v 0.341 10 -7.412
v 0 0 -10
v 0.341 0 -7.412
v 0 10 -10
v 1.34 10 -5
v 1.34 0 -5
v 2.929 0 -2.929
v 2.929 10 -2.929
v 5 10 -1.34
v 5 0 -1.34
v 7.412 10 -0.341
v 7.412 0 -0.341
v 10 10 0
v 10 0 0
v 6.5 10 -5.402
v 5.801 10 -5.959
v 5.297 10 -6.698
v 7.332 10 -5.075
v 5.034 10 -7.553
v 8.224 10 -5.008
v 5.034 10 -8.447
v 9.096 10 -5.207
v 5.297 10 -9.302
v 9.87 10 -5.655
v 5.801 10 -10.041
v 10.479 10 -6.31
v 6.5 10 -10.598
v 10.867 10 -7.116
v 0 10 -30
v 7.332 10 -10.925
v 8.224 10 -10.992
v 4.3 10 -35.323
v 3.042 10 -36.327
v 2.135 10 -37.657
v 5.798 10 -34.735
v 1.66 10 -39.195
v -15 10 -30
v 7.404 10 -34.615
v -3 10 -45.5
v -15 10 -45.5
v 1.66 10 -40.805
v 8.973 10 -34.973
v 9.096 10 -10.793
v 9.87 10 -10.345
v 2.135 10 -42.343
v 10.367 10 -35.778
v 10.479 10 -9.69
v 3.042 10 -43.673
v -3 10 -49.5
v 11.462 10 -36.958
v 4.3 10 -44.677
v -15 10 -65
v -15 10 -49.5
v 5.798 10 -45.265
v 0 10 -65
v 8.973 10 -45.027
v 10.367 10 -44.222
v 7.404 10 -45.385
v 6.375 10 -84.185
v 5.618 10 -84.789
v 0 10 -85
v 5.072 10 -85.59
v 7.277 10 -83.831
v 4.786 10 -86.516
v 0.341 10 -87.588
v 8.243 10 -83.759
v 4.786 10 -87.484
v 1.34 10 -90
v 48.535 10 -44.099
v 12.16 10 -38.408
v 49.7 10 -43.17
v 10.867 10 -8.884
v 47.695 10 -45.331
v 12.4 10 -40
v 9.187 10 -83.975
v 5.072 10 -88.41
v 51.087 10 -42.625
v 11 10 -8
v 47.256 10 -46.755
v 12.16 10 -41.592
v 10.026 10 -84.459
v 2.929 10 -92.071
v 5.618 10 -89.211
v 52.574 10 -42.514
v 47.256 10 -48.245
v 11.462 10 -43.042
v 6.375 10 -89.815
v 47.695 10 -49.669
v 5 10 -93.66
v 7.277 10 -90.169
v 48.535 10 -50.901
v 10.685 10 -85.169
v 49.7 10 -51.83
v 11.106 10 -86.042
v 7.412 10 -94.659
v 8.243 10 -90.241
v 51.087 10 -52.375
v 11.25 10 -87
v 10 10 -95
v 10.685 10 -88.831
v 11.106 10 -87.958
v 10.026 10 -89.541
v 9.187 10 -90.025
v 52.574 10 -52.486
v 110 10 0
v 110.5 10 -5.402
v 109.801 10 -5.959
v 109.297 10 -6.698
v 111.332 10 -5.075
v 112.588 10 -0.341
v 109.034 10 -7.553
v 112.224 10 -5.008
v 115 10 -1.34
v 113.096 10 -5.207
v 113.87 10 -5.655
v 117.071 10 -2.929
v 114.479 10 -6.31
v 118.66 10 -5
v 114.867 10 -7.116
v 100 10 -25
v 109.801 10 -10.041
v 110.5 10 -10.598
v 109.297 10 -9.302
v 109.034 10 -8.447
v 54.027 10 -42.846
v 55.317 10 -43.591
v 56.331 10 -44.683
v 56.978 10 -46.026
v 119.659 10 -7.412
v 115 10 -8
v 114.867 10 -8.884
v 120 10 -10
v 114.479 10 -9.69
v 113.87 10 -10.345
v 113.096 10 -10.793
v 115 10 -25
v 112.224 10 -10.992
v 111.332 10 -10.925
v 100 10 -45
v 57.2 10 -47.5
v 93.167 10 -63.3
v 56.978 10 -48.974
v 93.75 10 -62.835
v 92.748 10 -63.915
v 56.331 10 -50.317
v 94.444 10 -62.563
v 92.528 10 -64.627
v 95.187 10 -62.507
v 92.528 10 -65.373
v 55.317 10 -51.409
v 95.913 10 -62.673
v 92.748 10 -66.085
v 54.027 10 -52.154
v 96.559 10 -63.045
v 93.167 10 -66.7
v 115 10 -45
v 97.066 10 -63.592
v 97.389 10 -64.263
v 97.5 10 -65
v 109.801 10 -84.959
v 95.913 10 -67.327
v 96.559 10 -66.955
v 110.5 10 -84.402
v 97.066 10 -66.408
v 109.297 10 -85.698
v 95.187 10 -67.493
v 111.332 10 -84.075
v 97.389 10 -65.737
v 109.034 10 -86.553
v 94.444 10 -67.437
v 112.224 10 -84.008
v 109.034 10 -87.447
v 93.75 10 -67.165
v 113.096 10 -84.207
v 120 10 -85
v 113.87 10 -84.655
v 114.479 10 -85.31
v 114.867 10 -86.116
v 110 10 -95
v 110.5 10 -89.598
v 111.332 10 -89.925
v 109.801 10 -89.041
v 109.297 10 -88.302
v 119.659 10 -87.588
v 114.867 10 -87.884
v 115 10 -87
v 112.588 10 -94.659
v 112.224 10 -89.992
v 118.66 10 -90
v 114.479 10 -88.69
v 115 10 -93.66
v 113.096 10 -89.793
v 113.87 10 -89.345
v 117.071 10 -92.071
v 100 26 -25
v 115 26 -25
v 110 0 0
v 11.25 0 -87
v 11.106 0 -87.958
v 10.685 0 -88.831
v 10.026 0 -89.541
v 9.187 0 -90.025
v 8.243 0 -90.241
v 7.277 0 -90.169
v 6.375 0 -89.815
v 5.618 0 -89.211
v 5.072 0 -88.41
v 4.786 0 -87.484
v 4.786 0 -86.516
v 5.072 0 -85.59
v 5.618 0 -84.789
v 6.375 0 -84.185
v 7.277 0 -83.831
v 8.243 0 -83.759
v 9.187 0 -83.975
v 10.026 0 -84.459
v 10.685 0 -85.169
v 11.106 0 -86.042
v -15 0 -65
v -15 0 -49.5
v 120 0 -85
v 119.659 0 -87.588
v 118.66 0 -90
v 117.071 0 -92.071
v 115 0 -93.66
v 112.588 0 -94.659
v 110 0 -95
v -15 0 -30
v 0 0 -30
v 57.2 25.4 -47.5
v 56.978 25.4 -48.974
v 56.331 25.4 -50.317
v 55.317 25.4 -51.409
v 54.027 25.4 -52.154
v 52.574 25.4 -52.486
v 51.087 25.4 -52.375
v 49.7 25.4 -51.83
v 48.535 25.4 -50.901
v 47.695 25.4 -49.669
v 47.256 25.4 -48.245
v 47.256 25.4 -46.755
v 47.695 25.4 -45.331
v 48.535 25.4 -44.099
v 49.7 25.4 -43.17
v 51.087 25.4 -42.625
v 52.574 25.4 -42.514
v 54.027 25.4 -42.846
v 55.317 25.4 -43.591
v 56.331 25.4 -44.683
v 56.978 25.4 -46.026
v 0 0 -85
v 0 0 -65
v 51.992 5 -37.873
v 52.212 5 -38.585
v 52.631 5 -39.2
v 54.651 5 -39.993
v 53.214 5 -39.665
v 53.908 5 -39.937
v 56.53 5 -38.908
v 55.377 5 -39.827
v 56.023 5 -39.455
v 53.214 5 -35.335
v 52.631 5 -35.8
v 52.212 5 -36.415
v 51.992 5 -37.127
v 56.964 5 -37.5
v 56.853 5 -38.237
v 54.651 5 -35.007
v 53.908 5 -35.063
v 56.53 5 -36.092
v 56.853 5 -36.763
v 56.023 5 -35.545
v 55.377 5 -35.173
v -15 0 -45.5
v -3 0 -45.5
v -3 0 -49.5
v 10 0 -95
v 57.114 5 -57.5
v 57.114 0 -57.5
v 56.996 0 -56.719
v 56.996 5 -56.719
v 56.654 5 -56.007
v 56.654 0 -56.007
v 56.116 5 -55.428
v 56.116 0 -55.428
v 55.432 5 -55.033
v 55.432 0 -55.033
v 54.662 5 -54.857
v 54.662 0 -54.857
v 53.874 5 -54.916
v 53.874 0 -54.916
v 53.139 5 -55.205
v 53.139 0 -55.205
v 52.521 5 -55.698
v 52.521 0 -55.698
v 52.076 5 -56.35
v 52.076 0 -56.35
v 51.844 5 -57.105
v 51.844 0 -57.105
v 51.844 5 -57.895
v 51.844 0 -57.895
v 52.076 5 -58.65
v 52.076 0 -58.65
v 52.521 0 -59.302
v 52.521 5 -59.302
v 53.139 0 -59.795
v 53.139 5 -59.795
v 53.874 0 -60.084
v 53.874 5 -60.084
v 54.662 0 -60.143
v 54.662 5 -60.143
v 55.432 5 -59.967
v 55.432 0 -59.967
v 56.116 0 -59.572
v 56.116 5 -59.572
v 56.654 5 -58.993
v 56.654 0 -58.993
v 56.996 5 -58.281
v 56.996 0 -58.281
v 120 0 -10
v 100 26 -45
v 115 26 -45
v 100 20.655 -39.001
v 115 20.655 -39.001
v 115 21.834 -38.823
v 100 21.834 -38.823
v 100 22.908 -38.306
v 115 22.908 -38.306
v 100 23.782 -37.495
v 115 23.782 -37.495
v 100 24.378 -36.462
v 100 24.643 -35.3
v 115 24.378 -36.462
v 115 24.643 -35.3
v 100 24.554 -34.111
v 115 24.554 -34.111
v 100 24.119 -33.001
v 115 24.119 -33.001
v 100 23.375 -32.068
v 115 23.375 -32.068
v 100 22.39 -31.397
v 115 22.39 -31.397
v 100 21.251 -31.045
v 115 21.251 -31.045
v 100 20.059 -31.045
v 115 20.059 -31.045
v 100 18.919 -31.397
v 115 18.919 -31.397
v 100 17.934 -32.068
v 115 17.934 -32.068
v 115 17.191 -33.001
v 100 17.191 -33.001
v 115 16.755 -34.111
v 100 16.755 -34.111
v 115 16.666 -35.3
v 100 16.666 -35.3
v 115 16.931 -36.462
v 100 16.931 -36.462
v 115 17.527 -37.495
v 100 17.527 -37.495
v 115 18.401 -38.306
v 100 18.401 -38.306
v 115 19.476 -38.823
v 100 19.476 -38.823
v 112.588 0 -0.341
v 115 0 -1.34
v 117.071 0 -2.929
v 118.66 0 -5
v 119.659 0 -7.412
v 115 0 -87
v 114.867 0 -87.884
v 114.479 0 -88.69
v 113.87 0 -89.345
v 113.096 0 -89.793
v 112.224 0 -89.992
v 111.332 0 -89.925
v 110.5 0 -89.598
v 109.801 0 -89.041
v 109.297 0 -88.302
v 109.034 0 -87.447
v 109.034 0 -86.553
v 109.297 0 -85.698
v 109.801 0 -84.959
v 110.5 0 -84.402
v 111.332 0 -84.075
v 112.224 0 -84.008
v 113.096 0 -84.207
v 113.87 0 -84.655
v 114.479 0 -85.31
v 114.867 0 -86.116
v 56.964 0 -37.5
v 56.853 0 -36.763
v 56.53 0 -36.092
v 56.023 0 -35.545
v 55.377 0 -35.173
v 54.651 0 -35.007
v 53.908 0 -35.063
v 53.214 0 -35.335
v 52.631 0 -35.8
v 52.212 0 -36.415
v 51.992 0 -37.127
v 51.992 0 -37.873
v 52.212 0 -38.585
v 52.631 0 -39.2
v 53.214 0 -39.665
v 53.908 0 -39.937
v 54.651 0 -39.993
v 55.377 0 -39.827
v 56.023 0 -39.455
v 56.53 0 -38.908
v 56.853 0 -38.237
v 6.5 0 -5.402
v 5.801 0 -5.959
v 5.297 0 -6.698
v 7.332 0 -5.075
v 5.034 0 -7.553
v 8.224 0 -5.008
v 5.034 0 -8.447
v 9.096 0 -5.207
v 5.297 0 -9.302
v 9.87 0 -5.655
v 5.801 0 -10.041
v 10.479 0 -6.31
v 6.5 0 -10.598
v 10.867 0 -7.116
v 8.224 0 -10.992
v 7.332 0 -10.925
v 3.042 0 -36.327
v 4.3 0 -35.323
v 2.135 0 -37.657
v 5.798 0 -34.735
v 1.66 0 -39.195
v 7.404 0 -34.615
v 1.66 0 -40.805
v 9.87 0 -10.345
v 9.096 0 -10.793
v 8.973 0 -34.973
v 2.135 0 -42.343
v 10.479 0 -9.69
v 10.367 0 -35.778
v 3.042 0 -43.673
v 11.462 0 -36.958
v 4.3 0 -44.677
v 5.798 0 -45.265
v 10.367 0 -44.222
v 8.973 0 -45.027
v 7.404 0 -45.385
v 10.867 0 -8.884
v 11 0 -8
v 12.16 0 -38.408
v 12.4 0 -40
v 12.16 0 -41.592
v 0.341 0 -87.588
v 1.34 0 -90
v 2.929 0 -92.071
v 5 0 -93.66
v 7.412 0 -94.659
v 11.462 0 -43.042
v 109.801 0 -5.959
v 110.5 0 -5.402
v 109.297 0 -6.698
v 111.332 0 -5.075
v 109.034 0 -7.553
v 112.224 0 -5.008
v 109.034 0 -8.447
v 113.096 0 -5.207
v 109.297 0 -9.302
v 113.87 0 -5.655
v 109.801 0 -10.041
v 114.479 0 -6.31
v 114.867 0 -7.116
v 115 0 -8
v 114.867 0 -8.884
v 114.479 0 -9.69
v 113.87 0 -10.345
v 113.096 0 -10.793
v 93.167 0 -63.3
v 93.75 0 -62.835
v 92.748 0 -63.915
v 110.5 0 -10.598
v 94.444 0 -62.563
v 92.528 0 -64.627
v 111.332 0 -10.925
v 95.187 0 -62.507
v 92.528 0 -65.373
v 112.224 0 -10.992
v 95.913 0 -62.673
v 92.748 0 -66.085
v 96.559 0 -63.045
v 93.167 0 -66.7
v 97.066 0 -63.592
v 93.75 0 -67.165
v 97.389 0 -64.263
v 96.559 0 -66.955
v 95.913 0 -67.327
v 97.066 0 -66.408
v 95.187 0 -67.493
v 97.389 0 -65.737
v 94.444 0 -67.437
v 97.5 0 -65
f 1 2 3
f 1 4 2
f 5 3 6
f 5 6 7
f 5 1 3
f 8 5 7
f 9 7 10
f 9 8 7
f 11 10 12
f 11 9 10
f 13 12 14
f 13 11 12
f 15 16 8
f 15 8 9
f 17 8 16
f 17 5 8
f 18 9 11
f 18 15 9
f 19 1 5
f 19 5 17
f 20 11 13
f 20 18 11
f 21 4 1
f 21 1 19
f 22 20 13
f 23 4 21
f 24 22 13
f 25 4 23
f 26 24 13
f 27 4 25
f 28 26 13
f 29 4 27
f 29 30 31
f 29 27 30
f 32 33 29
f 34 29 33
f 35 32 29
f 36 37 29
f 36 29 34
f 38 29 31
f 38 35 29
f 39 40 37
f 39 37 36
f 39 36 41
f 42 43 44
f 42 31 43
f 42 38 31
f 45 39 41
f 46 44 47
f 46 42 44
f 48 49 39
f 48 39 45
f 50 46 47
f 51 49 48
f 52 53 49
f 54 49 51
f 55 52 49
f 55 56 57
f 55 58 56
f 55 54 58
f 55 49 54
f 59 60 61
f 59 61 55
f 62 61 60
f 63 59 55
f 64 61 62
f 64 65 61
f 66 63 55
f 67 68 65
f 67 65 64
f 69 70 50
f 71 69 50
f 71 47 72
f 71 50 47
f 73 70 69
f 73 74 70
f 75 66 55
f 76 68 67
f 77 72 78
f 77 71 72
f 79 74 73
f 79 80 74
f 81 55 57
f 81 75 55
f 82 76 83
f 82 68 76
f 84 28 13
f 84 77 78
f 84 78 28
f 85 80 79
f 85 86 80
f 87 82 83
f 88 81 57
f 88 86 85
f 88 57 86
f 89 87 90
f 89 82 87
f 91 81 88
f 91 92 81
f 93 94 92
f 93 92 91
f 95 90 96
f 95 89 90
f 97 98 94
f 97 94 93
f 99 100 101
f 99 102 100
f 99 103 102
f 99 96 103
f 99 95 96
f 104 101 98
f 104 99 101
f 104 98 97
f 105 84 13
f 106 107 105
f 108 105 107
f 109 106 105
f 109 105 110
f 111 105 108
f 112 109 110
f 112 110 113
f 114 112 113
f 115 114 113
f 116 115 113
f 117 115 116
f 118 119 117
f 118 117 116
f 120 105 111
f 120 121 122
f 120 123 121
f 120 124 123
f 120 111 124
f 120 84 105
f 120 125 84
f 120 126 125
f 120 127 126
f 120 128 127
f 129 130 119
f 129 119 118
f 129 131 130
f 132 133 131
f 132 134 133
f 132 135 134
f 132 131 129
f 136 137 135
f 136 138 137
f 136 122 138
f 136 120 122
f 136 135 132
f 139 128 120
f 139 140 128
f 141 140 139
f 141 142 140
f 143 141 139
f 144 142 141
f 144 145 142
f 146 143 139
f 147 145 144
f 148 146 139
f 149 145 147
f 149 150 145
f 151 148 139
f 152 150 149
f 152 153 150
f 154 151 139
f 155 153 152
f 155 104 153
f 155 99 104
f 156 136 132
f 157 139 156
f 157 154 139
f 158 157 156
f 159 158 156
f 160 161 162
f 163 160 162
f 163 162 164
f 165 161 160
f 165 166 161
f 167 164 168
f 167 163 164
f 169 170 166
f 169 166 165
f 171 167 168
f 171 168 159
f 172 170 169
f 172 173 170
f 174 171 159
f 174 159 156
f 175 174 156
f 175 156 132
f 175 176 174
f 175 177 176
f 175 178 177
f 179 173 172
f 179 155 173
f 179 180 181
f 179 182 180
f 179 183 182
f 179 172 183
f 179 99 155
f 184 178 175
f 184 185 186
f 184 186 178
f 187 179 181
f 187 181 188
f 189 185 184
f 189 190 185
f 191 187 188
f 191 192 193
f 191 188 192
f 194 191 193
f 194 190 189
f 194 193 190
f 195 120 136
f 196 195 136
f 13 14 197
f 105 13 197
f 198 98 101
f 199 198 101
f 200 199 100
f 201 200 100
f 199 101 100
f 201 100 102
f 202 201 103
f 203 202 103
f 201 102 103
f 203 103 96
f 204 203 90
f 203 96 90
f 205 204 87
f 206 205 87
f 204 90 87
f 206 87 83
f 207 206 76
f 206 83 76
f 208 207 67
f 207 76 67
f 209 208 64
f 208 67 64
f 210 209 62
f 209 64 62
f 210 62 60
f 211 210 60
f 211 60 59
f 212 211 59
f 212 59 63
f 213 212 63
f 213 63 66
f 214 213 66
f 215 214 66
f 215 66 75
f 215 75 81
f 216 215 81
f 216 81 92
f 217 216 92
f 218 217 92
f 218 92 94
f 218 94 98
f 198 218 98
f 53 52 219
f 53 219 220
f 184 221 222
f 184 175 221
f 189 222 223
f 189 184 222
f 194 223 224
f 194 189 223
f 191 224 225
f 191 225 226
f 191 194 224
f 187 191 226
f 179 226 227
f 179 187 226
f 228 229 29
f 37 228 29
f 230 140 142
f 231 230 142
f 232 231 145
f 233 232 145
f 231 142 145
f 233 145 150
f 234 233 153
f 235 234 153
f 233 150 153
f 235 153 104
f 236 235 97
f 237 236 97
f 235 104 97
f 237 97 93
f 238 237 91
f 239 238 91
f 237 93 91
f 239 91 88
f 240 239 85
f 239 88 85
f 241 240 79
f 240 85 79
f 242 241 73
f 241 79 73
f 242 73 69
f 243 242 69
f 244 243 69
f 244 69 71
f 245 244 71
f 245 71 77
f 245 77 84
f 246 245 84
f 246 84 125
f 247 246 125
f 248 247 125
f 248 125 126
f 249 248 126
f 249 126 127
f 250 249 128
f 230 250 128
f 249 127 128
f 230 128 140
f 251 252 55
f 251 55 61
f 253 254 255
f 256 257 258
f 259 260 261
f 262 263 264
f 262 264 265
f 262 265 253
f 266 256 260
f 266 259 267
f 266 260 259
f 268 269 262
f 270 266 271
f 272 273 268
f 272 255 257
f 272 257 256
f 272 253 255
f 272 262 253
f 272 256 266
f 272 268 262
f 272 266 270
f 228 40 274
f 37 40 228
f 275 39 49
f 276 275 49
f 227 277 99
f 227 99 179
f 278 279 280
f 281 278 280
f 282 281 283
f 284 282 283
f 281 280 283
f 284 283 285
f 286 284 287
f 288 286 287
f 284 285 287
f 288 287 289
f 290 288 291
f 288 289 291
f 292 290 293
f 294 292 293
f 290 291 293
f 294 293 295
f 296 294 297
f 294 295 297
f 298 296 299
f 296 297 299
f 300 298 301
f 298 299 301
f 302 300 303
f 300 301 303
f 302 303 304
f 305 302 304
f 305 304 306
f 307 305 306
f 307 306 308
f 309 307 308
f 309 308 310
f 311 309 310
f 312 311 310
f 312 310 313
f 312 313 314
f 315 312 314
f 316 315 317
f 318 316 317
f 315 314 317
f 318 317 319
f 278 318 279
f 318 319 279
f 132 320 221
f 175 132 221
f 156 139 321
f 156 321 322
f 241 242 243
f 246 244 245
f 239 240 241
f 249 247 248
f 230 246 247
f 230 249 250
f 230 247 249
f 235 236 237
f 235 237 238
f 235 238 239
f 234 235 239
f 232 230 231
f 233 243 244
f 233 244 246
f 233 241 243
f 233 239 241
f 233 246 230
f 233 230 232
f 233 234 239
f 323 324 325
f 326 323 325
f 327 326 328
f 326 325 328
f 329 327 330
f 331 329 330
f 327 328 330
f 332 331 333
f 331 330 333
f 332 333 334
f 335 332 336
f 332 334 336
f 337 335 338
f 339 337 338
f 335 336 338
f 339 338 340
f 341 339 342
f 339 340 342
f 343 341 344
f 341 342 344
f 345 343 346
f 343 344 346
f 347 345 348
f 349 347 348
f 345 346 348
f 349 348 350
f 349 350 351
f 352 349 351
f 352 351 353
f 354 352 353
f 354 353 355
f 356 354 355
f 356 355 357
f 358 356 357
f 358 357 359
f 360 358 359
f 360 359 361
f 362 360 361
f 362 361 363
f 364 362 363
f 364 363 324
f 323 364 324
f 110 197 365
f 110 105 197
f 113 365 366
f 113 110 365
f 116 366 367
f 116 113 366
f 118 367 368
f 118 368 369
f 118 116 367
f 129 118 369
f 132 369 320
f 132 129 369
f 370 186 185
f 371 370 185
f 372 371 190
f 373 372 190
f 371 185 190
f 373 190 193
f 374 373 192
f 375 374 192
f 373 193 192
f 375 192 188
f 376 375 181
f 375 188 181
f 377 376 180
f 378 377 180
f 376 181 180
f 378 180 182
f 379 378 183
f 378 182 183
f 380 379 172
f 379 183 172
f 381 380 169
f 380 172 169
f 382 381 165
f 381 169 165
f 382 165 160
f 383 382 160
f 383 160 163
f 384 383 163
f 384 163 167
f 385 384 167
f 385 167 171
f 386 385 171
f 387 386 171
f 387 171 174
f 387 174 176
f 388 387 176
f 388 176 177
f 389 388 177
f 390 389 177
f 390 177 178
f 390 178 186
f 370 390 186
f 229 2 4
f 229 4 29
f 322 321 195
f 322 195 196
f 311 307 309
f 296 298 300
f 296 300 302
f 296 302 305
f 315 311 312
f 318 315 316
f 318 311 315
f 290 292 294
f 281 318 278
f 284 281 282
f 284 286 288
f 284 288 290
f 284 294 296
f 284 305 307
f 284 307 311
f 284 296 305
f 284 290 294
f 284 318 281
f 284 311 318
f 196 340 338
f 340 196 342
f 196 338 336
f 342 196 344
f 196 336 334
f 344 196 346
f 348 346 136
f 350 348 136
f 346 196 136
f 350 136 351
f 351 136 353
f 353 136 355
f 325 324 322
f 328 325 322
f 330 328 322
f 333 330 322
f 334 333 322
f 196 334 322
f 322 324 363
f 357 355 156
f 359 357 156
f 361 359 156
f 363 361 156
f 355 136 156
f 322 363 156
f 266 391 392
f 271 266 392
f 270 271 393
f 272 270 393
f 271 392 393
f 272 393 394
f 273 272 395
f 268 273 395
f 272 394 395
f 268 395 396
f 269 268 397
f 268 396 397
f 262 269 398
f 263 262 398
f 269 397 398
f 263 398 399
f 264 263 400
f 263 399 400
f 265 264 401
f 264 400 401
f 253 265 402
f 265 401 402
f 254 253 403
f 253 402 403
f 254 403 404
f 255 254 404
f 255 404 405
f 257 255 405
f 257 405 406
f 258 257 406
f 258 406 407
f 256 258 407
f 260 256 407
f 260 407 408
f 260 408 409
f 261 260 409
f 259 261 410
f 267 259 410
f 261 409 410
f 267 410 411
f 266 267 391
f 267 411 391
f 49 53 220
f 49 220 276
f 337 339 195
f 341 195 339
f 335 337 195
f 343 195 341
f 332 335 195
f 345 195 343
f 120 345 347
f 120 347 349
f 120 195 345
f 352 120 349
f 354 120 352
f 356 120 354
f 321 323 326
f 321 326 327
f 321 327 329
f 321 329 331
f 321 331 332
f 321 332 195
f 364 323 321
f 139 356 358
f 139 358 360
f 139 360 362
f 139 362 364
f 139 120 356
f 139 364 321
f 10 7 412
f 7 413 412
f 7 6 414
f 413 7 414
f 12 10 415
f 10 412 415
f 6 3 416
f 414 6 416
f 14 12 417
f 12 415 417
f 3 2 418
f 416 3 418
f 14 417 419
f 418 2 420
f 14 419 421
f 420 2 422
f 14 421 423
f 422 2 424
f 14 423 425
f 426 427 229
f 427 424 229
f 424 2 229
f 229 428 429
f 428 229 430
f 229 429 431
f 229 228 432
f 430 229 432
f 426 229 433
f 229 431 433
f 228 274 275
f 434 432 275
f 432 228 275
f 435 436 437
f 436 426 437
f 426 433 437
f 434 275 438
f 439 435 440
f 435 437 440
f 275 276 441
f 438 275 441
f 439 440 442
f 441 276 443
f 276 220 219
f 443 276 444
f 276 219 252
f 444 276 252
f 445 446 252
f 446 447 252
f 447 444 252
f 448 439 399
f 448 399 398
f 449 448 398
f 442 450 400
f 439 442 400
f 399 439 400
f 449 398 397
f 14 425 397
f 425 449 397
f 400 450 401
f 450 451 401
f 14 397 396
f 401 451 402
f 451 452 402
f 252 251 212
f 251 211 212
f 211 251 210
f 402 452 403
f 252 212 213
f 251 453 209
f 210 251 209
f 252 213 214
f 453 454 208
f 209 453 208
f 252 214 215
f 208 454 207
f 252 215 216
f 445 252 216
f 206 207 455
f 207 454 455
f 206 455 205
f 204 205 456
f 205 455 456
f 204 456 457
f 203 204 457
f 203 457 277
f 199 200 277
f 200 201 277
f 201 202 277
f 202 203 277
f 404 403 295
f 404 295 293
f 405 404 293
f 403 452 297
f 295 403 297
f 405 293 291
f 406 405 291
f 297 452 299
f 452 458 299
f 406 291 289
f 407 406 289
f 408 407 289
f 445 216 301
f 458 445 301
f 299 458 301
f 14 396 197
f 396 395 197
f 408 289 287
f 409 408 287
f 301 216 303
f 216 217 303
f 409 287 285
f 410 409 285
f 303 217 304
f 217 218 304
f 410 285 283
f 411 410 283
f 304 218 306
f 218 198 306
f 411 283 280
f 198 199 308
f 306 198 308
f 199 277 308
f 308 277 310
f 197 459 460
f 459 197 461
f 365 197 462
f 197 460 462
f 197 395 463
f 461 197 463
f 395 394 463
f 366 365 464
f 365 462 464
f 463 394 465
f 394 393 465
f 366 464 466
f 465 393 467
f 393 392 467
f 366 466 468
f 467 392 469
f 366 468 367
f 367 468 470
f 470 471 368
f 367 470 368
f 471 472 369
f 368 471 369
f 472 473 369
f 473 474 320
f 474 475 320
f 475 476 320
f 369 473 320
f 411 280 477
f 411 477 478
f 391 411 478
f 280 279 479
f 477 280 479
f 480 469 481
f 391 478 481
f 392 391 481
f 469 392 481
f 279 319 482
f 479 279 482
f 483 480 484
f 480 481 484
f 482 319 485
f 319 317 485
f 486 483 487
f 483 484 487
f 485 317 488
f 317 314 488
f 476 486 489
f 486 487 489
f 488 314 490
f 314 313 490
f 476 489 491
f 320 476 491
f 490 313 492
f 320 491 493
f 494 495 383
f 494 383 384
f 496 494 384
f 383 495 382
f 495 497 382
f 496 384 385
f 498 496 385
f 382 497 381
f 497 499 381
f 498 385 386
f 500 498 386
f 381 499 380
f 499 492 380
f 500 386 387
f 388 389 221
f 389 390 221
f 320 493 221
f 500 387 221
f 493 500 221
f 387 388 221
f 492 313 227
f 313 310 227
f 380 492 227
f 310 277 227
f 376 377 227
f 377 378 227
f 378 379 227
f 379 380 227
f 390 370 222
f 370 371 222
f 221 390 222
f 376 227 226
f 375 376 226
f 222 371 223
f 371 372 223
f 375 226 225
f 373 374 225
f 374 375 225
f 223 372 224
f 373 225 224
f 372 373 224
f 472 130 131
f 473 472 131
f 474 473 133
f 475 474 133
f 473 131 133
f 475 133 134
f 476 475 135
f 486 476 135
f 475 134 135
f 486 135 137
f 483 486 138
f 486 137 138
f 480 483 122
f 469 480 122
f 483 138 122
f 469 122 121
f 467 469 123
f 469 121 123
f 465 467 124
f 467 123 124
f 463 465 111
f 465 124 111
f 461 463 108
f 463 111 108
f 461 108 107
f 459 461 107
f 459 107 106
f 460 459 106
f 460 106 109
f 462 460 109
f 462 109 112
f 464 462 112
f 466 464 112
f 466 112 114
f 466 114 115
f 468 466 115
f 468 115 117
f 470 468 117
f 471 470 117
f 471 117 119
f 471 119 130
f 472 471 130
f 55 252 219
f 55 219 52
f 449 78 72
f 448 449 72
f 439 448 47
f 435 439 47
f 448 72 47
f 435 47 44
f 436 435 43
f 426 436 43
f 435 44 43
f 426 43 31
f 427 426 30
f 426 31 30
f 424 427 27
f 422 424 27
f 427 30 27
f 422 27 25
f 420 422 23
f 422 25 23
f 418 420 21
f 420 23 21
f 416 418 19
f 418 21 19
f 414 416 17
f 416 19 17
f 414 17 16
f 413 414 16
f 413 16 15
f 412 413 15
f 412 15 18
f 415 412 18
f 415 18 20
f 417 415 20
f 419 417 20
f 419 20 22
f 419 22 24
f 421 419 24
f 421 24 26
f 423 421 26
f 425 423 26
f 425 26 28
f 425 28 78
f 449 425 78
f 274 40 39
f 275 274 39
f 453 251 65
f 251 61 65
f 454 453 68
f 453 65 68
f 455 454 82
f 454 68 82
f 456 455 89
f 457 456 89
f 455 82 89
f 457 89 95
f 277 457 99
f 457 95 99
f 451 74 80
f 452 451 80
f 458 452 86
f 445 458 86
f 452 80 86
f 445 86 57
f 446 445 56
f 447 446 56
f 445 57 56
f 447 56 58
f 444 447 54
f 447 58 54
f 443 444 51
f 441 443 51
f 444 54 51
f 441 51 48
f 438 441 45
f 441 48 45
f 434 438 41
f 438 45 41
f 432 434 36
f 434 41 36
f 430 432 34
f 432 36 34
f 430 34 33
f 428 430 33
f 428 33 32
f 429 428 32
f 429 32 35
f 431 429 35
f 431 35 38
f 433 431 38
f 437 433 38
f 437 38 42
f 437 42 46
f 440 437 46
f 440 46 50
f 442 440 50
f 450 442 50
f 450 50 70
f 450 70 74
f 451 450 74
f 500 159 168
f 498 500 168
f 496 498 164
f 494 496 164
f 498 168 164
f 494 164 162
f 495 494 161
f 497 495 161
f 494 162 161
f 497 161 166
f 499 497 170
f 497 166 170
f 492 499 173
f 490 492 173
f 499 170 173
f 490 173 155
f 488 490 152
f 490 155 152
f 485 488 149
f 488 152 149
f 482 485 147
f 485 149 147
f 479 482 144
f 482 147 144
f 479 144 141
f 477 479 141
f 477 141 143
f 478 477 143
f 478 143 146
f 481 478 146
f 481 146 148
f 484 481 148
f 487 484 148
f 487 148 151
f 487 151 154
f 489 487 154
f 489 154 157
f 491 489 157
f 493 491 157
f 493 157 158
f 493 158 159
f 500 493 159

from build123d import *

# Parameters (mm, degrees)
SKETCH1_W           = 120
SKETCH1_H           = 95
BOSS_EXTRUDE1_DEPTH = 10
FILLET1_R           = 10
SKETCH3_R           = 5
BOSS_EXTRUDE3_DEPTH = 15.4
SKETCH4_W           = 15
SKETCH4_H           = 20
BOSS_EXTRUDE4_DEPTH = 16
SKETCH5_W           = 35
SKETCH5_H           = 10
BOSS_EXTRUDE5_DEPTH = 15
SKETCH6_W           = 12
SKETCH6_H           = 4
CUT_EXTRUDE1_DEPTH  = 11
SKETCH8_R           = 5.4
CUT_EXTRUDE3_DEPTH  = 11
SKETCH9_R           = 2.5
CUT_EXTRUDE4_DEPTH  = 11
CUT_EXTRUDE5_REACH  = 132
SKETCH10_R          = 4
SKETCH11_R          = 3.25
SKETCH11_R_2        = 3
CUT_EXTRUDE6_DEPTH  = 11
SKETCH12_R          = 2.5
SKETCH12_R_2        = 2.65
CUT_EXTRUDE7_DEPTH  = 5


with BuildPart() as part:
    # Sketch1 → Boss-Extrude1 (new body)
    with BuildSketch(Plane(origin=(0, 0, 0), x_dir=(1, 0, 0), z_dir=(0, 1, 0))):
        with Locations((60, 47.5)):
            Rectangle(SKETCH1_W, SKETCH1_H)
    extrude(amount=BOSS_EXTRUDE1_DEPTH)

    # Fillet1
    fillet1_edges = [part.edges().sort_by_distance(p)[0] for p in [
        (0, 5, -95),
        (120, 5, -95),
        (120, 5, 0),
        (0, 5, 0),
    ]]
    fillet(fillet1_edges, radius=FILLET1_R)

    # Sketch3 → Boss-Extrude3 (add)
    with BuildSketch(Plane(origin=(0, 10, 0), x_dir=(1, 0, 0), z_dir=(0, 1, 0))):
        with Locations((52.2, 47.5)):
            Circle(SKETCH3_R)
    extrude(amount=BOSS_EXTRUDE3_DEPTH)

    # Sketch4 → Boss-Extrude4 (add)
    with BuildSketch(Plane(origin=(0, 10, 0), x_dir=(1, 0, 0), z_dir=(0, 1, 0))):
        with Locations((107.5, 35)):
            Rectangle(SKETCH4_W, SKETCH4_H)
    extrude(amount=BOSS_EXTRUDE4_DEPTH)

    # Sketch5 → Boss-Extrude5 (add)
    with BuildSketch(Plane.ZY):
        with Locations((-47.5, 5)):
            Rectangle(SKETCH5_W, SKETCH5_H)
    extrude(amount=BOSS_EXTRUDE5_DEPTH)

    # Sketch6 → Cut-Extrude1 (cut, through all)
    with BuildSketch(Plane(origin=(0, 10, 0), x_dir=(1, 0, 0), z_dir=(0, 1, 0))):
        with Locations((-9, 47.5)):
            Rectangle(SKETCH6_W, SKETCH6_H)
    extrude(amount=-CUT_EXTRUDE1_DEPTH, mode=Mode.SUBTRACT)

    # Sketch8 → Cut-Extrude3 (cut, through all)
    with BuildSketch(Plane(origin=(0, 10, 0), x_dir=(1, 0, 0), z_dir=(0, 1, 0))):
        with Locations((7, 40)):
            Circle(SKETCH8_R)
    extrude(amount=-CUT_EXTRUDE3_DEPTH, mode=Mode.SUBTRACT)

    # Sketch9 → Cut-Extrude4 (cut, through all)
    with BuildSketch(Plane(origin=(0, 10, 0), x_dir=(1, 0, 0), z_dir=(0, 1, 0))):
        with Locations((95, 65)):
            Circle(SKETCH9_R)
    extrude(amount=-CUT_EXTRUDE4_DEPTH, mode=Mode.SUBTRACT)

    # Sketch10 → Cut-Extrude5 (cut, up to next)
    with BuildSketch(Plane(origin=(115, 0, 0), x_dir=(0, 0, -1), z_dir=(1, 0, 0)), mode=Mode.PRIVATE) as cut_extrude5_sk1:
        with Locations((35.000693392, 20.654678352)):
            Circle(SKETCH10_R)
    cut_extrude5_tool1 = extrude(cut_extrude5_sk1.sketch, amount=-CUT_EXTRUDE5_REACH, mode=Mode.PRIVATE) & part.part
    add(cut_extrude5_tool1.solids().sort_by_distance((115, 20.654678, -35.000693))[0], mode=Mode.SUBTRACT)

    # Sketch11 → Cut-Extrude6 (cut, through all)
    with BuildSketch(Plane(origin=(0, 10, 0), x_dir=(1, 0, 0), z_dir=(0, 1, 0))):
        with Locations((8, 87)):
            Circle(SKETCH11_R)
        with Locations((112, 87)):
            Circle(SKETCH11_R_2)
        with Locations((8, 8)):
            Circle(SKETCH11_R_2)
        with Locations((112, 8)):
            Circle(SKETCH11_R_2)
    extrude(amount=-CUT_EXTRUDE6_DEPTH, mode=Mode.SUBTRACT)

    # Sketch12 → Cut-Extrude7 (cut)
    with BuildSketch(Plane.XZ):
        with Locations((54.463993766, -37.5)):
            Circle(SKETCH12_R)
        with Locations((54.463993766, -57.5)):
            Circle(SKETCH12_R_2)
    extrude(amount=-CUT_EXTRUDE7_DEPTH, mode=Mode.SUBTRACT)


solid = part.part
